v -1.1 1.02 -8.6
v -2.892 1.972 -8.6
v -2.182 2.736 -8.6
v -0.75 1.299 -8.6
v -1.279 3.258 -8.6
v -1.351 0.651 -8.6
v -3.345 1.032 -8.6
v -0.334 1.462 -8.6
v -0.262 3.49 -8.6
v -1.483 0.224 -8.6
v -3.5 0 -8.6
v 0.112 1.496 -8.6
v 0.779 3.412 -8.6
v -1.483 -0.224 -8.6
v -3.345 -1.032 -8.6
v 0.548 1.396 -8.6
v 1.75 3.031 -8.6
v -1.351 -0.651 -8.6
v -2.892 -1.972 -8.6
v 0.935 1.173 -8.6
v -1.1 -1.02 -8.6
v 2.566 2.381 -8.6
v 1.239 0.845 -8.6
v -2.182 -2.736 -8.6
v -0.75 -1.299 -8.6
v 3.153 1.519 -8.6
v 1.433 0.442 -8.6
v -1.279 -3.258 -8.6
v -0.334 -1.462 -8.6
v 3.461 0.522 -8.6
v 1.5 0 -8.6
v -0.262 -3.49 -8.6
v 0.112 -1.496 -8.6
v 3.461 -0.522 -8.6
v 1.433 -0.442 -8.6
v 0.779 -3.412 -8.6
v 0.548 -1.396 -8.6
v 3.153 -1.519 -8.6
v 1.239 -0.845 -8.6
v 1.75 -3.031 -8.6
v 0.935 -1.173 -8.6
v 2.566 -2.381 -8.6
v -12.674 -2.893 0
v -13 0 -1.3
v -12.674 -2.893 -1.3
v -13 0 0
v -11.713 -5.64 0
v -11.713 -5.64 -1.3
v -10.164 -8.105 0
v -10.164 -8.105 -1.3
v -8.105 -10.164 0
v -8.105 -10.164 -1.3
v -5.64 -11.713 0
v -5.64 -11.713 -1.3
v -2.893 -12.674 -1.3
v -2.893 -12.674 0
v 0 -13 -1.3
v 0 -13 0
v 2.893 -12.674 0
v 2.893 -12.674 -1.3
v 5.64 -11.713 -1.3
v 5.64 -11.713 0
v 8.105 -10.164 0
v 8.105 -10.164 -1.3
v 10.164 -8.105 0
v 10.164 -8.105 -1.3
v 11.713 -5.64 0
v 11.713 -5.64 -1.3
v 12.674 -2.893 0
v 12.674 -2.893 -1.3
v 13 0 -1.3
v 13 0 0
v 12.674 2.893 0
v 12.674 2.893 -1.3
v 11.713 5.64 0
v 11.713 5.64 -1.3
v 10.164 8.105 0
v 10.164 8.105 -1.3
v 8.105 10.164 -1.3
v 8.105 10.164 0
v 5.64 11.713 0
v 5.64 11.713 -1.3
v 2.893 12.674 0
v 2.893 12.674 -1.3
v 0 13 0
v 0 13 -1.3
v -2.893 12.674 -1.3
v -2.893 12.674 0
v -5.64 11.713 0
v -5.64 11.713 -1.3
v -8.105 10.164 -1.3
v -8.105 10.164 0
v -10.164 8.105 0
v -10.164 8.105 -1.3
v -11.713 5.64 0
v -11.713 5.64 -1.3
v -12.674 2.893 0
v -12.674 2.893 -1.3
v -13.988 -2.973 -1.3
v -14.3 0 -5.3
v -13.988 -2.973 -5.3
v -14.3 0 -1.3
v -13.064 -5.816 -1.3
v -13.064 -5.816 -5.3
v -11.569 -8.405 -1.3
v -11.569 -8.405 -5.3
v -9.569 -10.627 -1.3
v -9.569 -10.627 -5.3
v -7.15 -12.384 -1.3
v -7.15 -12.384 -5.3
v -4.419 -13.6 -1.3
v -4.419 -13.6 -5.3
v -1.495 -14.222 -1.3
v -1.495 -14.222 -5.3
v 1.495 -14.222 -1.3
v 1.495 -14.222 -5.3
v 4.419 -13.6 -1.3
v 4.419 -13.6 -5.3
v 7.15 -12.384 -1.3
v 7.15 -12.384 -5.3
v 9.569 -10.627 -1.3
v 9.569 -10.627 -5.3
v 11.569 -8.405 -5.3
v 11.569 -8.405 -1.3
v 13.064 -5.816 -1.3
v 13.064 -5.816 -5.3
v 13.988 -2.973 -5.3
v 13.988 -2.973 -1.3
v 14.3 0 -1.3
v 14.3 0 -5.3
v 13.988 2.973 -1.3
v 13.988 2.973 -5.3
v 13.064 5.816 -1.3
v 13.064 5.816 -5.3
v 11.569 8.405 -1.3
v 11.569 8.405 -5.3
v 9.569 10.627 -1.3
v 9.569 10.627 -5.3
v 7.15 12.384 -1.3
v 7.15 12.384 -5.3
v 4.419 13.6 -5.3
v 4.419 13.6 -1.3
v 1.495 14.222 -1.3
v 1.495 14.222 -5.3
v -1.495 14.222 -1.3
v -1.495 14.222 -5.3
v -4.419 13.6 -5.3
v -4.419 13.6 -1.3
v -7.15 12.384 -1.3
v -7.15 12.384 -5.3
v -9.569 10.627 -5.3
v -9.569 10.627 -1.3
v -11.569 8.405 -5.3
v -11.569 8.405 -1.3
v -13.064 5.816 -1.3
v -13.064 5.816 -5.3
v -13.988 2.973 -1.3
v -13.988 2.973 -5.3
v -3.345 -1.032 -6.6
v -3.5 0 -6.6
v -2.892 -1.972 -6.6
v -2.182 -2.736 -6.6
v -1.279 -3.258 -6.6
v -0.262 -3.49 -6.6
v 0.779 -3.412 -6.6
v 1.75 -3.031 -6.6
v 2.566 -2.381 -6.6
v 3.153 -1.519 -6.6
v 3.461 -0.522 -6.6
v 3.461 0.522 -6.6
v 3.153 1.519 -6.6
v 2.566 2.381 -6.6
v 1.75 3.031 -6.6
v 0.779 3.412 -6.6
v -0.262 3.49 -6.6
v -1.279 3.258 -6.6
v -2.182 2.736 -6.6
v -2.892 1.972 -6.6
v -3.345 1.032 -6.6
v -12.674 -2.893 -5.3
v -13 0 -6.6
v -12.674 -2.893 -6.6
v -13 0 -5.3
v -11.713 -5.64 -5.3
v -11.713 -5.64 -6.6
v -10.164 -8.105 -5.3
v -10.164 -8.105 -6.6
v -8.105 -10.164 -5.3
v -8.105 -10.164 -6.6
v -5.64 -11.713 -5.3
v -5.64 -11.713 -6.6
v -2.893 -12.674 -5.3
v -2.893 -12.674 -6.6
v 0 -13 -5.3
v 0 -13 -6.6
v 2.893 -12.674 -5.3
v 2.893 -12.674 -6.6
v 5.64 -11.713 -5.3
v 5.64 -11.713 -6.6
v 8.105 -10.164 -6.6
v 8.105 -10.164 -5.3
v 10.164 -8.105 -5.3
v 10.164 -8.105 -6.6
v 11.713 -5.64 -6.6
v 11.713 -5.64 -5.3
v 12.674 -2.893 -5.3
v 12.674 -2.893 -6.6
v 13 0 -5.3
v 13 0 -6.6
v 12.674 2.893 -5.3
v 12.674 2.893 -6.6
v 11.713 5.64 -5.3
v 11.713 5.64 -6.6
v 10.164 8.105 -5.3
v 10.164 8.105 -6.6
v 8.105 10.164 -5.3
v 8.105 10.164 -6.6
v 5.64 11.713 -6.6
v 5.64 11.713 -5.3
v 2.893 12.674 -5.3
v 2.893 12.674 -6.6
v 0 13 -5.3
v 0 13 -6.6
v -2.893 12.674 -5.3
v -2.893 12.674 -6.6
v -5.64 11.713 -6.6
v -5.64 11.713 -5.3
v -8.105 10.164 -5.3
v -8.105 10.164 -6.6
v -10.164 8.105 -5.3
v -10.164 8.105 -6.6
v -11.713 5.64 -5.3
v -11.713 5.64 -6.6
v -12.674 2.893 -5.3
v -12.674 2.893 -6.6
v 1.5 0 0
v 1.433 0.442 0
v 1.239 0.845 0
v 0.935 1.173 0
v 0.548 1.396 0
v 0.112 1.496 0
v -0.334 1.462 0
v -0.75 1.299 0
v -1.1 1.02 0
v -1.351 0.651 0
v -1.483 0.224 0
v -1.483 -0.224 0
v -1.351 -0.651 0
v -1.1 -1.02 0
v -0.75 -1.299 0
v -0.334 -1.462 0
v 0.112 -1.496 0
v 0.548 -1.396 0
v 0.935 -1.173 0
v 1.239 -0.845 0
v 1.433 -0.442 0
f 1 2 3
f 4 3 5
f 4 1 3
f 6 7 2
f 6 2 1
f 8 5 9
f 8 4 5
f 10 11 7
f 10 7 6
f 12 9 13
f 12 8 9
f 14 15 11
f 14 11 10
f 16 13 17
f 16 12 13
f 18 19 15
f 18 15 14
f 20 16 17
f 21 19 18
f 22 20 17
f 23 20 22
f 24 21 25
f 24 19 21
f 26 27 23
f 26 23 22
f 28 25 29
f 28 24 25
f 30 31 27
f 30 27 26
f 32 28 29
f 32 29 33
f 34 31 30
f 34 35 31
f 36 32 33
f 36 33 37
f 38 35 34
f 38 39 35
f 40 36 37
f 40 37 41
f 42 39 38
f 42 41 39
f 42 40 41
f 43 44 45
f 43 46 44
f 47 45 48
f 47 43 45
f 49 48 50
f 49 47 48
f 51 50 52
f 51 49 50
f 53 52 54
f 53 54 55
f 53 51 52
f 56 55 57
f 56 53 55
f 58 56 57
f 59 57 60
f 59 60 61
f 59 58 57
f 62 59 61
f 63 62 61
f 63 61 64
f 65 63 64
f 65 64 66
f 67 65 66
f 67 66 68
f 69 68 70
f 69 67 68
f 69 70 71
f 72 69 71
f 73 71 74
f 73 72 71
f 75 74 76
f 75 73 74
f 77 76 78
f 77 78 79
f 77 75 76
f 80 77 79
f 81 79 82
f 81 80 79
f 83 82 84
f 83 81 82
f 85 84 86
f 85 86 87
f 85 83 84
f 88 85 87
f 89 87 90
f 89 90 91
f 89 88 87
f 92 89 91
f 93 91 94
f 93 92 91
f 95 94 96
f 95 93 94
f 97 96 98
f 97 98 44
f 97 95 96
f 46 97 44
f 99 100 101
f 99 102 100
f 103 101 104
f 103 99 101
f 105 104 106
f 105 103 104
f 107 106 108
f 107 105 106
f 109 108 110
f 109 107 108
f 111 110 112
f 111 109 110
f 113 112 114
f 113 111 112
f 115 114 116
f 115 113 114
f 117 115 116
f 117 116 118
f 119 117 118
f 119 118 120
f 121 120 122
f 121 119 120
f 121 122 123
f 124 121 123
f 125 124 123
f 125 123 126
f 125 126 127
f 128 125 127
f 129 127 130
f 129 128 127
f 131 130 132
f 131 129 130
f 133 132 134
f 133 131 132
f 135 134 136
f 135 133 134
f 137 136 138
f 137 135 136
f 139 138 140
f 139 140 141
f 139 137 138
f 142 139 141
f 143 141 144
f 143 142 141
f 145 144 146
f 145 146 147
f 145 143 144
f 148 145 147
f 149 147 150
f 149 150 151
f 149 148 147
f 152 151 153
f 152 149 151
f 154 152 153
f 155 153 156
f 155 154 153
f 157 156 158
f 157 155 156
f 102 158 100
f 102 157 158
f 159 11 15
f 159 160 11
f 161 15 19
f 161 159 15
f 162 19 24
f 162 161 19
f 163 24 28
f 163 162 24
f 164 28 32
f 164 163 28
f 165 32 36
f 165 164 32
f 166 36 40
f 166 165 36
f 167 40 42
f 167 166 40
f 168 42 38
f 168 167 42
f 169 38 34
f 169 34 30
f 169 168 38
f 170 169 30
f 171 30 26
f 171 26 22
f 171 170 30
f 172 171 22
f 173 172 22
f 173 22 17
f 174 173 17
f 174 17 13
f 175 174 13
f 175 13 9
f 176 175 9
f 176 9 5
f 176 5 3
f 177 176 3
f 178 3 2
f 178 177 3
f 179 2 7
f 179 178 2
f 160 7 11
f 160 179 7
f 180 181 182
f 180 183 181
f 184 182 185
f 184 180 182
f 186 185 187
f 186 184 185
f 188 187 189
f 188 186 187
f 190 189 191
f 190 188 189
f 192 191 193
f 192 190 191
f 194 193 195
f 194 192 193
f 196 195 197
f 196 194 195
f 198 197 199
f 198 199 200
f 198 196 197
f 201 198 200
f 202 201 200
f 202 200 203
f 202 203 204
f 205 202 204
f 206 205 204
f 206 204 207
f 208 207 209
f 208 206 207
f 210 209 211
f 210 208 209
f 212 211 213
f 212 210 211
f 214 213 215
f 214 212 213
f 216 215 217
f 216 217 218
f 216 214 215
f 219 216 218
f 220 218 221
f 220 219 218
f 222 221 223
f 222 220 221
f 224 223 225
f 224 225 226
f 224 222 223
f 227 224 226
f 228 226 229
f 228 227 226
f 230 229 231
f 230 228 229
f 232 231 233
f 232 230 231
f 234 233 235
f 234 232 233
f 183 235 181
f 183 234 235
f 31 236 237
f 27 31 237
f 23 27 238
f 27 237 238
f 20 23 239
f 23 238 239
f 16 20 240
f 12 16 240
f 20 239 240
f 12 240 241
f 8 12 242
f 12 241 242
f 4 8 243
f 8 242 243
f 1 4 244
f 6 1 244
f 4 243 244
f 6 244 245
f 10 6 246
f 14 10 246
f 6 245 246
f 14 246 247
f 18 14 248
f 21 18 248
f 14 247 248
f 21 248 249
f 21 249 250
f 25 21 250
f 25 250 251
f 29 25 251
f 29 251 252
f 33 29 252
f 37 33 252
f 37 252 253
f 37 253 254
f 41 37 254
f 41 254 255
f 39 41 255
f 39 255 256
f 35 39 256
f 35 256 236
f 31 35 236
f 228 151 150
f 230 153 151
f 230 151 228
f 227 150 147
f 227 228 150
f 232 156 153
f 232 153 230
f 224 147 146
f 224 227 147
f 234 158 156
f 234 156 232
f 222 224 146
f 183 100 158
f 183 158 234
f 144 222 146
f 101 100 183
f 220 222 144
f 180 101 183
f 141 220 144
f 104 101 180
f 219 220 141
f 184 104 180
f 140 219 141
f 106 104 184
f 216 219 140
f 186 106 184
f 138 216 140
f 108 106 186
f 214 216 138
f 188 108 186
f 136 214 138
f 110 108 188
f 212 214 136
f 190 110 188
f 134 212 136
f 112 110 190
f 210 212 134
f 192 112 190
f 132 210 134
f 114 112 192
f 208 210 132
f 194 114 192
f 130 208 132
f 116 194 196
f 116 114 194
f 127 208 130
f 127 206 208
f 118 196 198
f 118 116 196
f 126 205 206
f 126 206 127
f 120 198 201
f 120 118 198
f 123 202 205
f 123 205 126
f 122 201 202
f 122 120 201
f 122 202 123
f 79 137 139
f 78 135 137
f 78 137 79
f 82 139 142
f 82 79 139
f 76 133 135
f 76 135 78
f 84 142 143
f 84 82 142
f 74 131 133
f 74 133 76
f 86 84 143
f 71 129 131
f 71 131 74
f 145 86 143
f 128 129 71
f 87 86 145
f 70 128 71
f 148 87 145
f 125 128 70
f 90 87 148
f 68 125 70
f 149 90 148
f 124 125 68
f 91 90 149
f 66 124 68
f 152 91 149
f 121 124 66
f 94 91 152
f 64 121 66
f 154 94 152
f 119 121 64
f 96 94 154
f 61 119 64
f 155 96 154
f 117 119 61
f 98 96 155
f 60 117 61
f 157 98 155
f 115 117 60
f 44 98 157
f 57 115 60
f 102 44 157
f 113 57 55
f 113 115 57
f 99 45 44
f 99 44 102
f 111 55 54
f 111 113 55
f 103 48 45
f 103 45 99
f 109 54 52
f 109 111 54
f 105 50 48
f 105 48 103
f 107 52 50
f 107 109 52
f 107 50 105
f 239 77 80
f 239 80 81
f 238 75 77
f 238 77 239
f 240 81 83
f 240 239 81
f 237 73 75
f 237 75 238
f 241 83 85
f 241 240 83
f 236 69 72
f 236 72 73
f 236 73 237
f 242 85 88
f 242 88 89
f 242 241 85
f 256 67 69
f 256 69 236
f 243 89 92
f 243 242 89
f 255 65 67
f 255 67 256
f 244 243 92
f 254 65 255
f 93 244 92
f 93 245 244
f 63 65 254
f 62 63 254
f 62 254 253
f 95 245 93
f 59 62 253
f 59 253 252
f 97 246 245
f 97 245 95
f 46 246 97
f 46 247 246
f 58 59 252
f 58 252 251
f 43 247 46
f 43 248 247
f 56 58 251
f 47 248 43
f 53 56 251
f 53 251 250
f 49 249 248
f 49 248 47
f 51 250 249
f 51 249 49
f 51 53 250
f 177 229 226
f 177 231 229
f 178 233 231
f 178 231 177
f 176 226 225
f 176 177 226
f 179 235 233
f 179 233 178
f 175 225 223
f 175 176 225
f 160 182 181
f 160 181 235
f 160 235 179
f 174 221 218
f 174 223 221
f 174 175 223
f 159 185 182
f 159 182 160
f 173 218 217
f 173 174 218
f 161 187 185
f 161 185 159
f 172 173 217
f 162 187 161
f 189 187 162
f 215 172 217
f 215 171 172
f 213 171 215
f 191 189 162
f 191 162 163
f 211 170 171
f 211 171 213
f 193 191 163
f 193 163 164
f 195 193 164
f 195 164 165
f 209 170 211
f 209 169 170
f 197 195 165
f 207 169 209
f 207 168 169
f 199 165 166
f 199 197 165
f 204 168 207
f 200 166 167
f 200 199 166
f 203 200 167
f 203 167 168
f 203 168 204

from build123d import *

# Parameters (mm, degrees)
SKETCH3_R          = 1.5
CUT_EXTRUDE1_DEPTH = 22.975895886


with BuildPart() as part:
    # Sketch1 → Revolve1 (revolve)
    with BuildSketch(Plane(origin=(0, 0, 0), x_dir=(0, 0, -1), z_dir=(1, 0, 0)), mode=Mode.PRIVATE) as revolve1_sk:
        Polygon((6.6, 13), (5.3, 13), (5.3, 14.3), (1.3, 14.3), (1.3, 13), (0, 13), (0, 0), (8.6, 0), (8.6, 3.5), (6.6, 3.5), align=None)
    revolve(revolve1_sk.sketch.rotate(Axis((0, 0, -12.817719844), (0, 0, 1)), 90), axis=Axis((0, 0, -12.817719844), (0, 0, 1)))

    # Sketch3 → Cut-Extrude1 (cut, through all)
    with BuildSketch(Plane.XY):
        Circle(SKETCH3_R)
    extrude(amount=-CUT_EXTRUDE1_DEPTH, mode=Mode.SUBTRACT)


solid = part.part
